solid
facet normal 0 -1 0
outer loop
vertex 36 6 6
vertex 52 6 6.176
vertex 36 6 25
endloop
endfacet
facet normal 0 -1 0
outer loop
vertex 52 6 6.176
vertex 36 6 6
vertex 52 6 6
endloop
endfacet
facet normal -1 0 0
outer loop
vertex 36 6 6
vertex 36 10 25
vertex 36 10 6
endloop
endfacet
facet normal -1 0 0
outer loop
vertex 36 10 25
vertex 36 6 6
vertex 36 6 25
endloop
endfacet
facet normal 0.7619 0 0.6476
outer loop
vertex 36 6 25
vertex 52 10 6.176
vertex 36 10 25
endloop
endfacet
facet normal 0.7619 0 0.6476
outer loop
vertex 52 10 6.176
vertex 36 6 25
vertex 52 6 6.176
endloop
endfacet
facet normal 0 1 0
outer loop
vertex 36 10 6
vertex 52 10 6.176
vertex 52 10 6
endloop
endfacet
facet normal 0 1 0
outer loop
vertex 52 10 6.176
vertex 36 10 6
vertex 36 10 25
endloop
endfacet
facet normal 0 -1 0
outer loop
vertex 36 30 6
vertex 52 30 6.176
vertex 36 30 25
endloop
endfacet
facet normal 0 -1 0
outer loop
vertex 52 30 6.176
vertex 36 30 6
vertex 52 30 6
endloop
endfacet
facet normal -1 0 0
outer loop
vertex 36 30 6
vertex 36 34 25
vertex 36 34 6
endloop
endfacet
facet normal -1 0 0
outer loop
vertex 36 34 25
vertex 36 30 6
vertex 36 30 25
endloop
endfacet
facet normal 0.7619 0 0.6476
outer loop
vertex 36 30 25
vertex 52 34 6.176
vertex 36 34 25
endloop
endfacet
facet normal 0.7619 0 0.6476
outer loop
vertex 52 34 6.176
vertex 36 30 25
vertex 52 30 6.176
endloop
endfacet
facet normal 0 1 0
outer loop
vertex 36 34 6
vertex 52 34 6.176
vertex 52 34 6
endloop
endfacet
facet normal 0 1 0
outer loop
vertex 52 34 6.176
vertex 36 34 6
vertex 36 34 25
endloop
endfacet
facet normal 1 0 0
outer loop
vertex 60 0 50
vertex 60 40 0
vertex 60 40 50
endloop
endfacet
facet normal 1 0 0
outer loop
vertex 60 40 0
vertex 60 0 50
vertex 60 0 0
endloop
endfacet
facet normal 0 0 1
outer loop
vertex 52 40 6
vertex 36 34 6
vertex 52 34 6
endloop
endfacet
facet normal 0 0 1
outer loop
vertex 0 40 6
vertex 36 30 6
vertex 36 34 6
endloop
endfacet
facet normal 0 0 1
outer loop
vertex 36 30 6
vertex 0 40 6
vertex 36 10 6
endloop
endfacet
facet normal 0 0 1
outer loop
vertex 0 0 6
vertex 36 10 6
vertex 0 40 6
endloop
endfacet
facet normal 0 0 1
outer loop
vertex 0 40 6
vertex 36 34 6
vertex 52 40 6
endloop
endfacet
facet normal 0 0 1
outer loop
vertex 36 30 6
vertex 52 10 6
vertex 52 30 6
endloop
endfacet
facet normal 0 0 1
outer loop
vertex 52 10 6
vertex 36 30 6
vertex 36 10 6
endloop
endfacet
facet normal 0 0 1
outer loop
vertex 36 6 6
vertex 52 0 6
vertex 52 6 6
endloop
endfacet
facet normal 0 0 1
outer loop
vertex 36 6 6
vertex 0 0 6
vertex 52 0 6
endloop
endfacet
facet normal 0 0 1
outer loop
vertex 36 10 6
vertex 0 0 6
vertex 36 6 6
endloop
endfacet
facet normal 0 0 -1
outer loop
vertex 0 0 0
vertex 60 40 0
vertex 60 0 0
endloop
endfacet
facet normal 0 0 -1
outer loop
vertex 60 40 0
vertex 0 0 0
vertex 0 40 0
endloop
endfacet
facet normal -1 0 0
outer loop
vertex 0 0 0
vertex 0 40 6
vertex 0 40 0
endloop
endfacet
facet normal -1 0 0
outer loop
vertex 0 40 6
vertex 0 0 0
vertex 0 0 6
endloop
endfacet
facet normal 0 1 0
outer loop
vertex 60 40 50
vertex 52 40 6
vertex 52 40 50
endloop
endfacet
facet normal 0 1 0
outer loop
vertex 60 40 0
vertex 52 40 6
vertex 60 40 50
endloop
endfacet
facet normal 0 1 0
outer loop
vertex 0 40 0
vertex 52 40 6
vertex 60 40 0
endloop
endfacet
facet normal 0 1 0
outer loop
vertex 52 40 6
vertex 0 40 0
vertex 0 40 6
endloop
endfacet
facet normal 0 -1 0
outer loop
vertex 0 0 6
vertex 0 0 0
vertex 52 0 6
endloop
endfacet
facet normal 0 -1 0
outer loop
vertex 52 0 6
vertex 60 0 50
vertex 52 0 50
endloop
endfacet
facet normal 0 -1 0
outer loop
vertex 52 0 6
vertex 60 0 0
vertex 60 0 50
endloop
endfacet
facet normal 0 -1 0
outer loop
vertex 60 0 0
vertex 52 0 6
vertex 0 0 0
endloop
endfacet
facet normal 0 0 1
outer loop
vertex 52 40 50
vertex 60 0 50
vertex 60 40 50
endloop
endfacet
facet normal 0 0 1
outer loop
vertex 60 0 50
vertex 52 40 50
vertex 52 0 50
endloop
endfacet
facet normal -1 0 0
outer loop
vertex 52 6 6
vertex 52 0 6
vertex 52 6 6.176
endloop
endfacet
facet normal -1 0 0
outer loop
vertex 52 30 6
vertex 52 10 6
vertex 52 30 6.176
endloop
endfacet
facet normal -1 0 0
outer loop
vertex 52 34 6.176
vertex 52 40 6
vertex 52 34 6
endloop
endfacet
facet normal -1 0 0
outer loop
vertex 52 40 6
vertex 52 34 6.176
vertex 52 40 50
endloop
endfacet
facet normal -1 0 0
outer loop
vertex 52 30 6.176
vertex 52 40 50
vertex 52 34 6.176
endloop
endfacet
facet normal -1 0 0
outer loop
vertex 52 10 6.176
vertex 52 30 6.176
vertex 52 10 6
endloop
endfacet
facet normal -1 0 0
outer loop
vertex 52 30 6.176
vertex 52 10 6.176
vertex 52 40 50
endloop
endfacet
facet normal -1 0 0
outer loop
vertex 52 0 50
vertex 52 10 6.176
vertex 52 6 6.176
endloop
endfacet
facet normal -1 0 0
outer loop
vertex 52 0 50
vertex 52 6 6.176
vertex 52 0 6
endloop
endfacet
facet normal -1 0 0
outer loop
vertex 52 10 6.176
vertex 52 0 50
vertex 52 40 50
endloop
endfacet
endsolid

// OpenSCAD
$fn = 32;

// ----------------------------------------------------------------------
// Rib bracket: 2-gusset L bracket
// ----------------------------------------------------------------------

// --- parameters (mm) ---
base_l = 60;              // foot length, X
base_w = 40;              // foot width, Y
base_t = 6;               // foot thickness
plate_t = 8;              // upright plate thickness
plate_h = 50;             // overall height
gus_l = 16;               // gusset leg along the foot
gus_h = 20;               // gusset height
gus_t = 4;                // gusset thickness
gus_edge = 6;             // gusset margin from the foot edge
n_gus = 2;                // gusset count

gus_pitch = (base_w - 2 * gus_edge - gus_t) / (n_gus - 1);  // gusset pitch

union() {
  cube([base_l, base_w, base_t]);
  translate([base_l - plate_t, 0, base_t - 1])
    cube([plate_t, base_w, plate_h - base_t + 1]);
  for (i = [0 : n_gus - 1])
    translate([base_l - plate_t - gus_l, gus_edge + i * gus_pitch, base_t - 1])
      rotate([-90, 0, 0])
        linear_extrude(height = gus_t)
          polygon(points = [[0, 0], [gus_l + 1, 0], [0, -gus_h]]);
}
